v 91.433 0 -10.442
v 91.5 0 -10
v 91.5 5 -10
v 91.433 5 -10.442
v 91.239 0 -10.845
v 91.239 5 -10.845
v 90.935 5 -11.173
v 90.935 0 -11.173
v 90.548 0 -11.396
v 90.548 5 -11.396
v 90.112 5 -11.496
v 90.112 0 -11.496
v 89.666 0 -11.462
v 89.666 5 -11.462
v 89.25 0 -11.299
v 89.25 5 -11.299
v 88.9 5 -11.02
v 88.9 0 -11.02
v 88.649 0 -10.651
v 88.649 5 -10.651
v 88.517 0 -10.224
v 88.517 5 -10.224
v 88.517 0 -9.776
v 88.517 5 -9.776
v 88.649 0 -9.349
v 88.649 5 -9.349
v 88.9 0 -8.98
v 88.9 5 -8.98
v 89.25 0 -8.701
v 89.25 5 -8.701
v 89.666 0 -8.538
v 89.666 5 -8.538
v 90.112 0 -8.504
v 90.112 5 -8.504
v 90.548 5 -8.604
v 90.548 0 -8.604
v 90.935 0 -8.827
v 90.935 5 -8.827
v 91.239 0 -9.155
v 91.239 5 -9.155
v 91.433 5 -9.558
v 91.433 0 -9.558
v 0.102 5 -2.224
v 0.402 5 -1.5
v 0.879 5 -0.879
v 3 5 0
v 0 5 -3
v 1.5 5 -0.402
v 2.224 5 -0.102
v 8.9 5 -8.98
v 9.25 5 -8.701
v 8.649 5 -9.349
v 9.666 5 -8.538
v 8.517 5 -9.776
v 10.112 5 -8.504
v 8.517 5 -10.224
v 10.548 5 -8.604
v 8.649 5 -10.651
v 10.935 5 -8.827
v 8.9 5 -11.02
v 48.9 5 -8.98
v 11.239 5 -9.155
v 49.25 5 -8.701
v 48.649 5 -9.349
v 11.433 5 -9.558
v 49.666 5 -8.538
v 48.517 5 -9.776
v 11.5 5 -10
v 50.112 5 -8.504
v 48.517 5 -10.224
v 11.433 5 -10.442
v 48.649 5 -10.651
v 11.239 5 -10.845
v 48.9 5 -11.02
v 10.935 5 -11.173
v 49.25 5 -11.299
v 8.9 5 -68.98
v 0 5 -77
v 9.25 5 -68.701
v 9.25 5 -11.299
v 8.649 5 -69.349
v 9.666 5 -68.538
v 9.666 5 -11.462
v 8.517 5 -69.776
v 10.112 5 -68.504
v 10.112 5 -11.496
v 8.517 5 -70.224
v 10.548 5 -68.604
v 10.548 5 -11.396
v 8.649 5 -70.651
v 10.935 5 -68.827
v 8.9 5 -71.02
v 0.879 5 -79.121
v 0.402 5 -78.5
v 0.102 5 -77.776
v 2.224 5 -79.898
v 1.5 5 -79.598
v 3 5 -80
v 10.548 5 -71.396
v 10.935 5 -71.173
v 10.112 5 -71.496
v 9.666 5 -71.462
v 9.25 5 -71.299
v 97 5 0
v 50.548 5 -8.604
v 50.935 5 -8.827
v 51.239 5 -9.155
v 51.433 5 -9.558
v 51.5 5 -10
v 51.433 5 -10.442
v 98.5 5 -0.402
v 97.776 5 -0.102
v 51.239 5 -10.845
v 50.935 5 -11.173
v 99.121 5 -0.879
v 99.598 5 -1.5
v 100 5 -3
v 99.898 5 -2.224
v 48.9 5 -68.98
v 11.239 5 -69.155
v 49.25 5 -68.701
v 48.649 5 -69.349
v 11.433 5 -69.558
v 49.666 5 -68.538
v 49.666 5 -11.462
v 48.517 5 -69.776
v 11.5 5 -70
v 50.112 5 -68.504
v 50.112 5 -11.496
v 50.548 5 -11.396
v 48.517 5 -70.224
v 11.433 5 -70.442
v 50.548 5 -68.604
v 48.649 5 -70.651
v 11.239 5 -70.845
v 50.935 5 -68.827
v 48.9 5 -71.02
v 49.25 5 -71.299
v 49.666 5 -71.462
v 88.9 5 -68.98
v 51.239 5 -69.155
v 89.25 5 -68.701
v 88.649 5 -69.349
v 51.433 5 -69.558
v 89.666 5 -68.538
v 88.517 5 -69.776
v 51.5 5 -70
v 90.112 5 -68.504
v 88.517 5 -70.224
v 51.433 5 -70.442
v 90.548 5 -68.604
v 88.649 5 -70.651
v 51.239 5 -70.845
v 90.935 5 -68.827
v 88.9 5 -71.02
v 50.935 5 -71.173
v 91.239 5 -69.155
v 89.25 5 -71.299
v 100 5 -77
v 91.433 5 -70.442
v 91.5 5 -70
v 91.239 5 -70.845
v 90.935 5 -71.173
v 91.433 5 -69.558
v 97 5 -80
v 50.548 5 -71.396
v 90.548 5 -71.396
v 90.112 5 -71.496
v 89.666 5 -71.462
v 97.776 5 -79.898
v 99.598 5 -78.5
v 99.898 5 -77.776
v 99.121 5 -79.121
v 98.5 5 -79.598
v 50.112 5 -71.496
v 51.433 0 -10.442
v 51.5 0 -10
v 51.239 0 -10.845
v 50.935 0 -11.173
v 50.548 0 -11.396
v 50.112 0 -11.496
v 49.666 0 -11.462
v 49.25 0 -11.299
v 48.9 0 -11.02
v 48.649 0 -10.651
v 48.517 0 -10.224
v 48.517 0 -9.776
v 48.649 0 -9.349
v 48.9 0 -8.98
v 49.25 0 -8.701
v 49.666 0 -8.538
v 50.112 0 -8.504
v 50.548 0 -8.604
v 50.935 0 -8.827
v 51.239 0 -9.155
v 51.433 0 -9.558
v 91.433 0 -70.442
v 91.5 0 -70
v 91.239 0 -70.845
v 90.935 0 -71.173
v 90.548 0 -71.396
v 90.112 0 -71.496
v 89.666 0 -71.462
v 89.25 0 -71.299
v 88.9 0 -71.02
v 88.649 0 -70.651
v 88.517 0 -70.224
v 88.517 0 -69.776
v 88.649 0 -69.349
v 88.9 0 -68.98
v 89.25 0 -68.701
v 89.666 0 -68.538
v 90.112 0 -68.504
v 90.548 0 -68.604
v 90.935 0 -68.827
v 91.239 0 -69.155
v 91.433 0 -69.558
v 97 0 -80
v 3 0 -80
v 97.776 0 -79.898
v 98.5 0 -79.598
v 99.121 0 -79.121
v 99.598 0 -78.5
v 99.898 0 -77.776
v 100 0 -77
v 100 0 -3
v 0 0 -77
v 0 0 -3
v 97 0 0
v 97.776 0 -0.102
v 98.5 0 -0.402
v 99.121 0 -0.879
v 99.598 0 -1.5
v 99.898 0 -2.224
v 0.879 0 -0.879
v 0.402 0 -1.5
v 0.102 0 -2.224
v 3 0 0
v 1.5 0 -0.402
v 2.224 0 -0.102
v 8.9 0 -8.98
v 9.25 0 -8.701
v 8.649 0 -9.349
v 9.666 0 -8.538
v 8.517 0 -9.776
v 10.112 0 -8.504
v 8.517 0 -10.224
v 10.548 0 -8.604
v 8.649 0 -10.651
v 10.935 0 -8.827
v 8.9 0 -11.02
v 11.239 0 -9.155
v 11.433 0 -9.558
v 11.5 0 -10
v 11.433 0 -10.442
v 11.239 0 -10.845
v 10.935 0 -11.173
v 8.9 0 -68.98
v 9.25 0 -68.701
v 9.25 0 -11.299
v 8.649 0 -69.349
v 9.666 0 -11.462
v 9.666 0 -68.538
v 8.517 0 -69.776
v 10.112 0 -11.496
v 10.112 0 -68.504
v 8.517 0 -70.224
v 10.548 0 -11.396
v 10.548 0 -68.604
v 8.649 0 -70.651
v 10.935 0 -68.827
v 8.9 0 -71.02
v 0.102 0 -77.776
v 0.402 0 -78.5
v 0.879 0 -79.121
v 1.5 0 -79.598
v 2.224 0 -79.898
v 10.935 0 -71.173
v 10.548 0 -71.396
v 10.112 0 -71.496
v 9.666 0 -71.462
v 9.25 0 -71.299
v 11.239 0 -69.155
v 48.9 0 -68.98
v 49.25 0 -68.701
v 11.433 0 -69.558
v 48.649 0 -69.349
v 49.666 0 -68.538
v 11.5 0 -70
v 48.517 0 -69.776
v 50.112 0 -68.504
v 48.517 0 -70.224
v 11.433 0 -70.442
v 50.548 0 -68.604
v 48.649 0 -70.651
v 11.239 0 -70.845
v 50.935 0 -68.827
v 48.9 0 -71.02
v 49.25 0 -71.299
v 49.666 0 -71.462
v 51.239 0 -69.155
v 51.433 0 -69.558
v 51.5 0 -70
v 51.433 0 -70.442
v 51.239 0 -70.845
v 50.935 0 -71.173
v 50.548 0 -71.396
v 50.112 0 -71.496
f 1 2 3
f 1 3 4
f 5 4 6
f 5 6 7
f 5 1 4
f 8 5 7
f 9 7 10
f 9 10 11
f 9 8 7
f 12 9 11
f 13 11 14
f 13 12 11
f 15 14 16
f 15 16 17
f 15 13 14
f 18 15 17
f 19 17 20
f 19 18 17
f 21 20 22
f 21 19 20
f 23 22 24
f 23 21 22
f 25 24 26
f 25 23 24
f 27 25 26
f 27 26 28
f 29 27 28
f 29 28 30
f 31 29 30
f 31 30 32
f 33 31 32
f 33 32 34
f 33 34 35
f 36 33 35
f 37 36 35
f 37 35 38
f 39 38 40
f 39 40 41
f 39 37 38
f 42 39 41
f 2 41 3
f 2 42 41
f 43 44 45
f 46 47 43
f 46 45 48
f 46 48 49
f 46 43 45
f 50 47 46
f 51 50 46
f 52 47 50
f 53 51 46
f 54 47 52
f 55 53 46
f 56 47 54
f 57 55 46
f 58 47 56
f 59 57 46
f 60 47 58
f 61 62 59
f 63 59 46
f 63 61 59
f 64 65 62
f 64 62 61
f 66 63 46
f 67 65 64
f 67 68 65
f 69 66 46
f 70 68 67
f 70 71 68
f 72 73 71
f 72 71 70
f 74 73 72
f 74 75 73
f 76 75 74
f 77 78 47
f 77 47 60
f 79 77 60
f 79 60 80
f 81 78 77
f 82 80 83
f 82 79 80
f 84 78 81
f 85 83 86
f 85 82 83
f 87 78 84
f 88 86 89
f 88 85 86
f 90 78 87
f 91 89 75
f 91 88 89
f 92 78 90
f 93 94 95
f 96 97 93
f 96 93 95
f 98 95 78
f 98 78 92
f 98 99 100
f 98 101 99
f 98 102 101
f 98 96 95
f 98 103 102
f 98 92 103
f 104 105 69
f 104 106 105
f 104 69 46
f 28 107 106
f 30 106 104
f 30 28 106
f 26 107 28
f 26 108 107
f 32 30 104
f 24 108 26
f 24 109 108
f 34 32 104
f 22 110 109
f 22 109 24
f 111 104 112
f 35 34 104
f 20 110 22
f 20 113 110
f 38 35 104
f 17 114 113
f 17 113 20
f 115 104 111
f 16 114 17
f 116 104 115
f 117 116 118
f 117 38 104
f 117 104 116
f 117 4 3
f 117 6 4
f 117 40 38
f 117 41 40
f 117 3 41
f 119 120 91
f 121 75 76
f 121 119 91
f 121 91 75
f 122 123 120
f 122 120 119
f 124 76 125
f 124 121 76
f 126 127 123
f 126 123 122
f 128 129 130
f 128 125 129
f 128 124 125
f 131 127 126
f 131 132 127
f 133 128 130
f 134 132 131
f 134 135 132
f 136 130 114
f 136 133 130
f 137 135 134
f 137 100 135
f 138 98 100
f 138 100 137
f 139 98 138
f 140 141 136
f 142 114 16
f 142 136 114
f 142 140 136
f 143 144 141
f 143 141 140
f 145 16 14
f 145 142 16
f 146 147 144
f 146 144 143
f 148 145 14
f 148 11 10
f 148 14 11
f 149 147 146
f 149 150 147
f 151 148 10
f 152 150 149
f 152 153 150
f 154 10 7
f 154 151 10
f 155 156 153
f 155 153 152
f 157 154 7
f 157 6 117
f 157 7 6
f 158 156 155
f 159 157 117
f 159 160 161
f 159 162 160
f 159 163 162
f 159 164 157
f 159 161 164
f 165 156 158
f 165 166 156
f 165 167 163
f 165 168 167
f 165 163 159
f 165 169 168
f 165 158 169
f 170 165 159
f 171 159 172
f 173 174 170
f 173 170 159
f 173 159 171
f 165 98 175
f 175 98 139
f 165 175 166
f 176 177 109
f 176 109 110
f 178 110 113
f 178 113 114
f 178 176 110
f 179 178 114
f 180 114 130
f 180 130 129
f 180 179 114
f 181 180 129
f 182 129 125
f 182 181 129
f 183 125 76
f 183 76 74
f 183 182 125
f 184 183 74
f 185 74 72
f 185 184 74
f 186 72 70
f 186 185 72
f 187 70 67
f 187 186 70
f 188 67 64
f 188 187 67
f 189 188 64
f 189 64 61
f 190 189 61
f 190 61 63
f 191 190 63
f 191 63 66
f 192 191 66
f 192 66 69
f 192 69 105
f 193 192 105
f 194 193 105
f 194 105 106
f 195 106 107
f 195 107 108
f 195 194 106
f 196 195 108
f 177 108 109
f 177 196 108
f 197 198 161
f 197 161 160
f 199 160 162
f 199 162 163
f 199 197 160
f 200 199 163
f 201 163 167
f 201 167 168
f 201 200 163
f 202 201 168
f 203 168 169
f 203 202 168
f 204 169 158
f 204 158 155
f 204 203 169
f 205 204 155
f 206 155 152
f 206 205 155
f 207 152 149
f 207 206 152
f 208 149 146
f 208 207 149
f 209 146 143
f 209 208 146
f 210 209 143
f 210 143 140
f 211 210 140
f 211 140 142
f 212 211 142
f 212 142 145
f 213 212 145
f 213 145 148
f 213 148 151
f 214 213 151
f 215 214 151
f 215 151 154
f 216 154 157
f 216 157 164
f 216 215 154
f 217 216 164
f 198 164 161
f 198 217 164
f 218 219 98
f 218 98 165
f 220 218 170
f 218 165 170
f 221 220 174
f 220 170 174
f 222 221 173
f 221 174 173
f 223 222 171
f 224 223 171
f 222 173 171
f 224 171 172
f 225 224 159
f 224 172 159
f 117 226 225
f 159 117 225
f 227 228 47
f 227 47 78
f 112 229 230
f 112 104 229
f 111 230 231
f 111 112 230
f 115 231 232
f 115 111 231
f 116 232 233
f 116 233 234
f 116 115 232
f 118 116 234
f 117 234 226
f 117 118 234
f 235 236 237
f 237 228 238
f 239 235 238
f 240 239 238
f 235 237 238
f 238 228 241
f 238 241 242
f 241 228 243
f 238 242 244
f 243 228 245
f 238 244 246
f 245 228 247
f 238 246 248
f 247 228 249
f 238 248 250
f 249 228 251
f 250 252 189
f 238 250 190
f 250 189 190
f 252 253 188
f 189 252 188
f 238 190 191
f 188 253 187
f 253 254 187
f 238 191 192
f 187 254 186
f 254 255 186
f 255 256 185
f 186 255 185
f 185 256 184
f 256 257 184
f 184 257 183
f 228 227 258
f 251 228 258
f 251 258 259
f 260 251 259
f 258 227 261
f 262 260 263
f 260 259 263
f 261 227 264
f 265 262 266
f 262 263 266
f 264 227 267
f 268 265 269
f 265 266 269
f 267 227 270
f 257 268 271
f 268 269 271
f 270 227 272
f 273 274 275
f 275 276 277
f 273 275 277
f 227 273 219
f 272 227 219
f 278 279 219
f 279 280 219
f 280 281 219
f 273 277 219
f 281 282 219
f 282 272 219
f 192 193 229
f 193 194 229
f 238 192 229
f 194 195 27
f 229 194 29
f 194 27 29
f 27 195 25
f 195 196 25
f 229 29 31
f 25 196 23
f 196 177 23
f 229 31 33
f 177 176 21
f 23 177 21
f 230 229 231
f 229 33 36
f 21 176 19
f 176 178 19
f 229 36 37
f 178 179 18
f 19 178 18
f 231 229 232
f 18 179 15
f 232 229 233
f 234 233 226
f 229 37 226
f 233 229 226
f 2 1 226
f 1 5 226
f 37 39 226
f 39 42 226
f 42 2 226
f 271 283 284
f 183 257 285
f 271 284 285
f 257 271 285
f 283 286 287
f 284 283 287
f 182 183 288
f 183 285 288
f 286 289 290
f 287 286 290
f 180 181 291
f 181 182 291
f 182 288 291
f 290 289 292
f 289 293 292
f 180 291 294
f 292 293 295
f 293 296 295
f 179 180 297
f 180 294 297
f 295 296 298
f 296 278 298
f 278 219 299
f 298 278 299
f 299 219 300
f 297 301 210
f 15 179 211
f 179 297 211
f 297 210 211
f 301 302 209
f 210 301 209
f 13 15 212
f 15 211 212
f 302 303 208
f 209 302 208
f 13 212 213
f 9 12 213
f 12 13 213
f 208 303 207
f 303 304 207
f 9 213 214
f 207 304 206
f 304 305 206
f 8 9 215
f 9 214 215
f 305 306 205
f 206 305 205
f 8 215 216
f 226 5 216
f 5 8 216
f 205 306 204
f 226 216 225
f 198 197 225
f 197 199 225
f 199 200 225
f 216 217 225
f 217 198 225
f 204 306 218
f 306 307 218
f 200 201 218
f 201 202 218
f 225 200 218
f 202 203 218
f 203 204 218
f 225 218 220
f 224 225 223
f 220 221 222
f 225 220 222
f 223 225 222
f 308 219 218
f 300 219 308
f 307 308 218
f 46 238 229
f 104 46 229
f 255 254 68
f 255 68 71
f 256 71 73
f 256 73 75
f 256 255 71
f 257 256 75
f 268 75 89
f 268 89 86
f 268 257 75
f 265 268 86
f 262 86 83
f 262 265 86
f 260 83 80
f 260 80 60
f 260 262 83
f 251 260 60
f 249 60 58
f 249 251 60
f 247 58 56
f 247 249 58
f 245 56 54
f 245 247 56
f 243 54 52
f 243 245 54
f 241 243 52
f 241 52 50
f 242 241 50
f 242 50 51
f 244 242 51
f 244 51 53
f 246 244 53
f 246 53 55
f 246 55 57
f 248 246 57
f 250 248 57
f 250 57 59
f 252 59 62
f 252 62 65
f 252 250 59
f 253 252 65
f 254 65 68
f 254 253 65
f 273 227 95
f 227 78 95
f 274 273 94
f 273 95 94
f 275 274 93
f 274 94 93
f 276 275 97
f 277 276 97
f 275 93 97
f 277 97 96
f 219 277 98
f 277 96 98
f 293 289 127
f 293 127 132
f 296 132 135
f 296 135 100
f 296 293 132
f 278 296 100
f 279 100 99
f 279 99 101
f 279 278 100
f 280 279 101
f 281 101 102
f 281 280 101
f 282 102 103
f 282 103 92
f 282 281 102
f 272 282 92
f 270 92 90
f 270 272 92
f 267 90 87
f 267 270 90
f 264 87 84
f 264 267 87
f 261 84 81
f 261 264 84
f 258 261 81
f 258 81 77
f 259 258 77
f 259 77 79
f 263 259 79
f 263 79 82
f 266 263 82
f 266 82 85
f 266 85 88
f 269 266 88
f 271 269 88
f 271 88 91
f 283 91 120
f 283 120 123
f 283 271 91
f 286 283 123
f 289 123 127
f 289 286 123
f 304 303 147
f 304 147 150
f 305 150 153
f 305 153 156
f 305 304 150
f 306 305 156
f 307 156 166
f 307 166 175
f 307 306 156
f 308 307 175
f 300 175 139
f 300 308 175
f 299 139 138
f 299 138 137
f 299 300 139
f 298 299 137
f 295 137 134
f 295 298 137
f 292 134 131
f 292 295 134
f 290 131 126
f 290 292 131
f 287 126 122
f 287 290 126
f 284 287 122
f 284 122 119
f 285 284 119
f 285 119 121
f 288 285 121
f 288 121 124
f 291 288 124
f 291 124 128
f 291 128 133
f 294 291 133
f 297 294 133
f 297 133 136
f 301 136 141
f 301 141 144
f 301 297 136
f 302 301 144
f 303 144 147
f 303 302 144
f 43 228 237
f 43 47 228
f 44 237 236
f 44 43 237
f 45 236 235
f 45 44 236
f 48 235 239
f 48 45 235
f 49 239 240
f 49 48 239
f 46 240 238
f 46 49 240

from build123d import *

# Parameters (mm, degrees)
SKETCH_2_W      = 100
SKETCH_2_H      = 80
SKETCH_2_R      = 1.5
EXTRUDE_1_DEPTH = 5
FILLET_1_R      = 3


with BuildPart() as part:
    # 草图2 → 凸台-拉伸1 (new body)
    with BuildSketch(Plane(origin=(0, 0, 0), x_dir=(1, 0, 0), z_dir=(0, 1, 0))):
        with Locations((50, 40)):
            Rectangle(SKETCH_2_W, SKETCH_2_H)
        with Locations((10, 10)):
            Circle(SKETCH_2_R, mode=Mode.SUBTRACT)
        with Locations((50, 10)):
            Circle(SKETCH_2_R, mode=Mode.SUBTRACT)
        with Locations((90, 10)):
            Circle(SKETCH_2_R, mode=Mode.SUBTRACT)
        with Locations((90, 70)):
            Circle(SKETCH_2_R, mode=Mode.SUBTRACT)
        with Locations((50, 70)):
            Circle(SKETCH_2_R, mode=Mode.SUBTRACT)
        with Locations((10, 70)):
            Circle(SKETCH_2_R, mode=Mode.SUBTRACT)
    extrude(amount=EXTRUDE_1_DEPTH)

    # 圆角1
    fillet_1_edges = [part.edges().sort_by_distance(p)[0] for p in [
        (0, 2.5, -80),
        (100, 2.5, -80),
        (100, 2.5, 0),
        (0, 2.5, 0),
    ]]
    fillet(fillet_1_edges, radius=FILLET_1_R)


solid = part.part
